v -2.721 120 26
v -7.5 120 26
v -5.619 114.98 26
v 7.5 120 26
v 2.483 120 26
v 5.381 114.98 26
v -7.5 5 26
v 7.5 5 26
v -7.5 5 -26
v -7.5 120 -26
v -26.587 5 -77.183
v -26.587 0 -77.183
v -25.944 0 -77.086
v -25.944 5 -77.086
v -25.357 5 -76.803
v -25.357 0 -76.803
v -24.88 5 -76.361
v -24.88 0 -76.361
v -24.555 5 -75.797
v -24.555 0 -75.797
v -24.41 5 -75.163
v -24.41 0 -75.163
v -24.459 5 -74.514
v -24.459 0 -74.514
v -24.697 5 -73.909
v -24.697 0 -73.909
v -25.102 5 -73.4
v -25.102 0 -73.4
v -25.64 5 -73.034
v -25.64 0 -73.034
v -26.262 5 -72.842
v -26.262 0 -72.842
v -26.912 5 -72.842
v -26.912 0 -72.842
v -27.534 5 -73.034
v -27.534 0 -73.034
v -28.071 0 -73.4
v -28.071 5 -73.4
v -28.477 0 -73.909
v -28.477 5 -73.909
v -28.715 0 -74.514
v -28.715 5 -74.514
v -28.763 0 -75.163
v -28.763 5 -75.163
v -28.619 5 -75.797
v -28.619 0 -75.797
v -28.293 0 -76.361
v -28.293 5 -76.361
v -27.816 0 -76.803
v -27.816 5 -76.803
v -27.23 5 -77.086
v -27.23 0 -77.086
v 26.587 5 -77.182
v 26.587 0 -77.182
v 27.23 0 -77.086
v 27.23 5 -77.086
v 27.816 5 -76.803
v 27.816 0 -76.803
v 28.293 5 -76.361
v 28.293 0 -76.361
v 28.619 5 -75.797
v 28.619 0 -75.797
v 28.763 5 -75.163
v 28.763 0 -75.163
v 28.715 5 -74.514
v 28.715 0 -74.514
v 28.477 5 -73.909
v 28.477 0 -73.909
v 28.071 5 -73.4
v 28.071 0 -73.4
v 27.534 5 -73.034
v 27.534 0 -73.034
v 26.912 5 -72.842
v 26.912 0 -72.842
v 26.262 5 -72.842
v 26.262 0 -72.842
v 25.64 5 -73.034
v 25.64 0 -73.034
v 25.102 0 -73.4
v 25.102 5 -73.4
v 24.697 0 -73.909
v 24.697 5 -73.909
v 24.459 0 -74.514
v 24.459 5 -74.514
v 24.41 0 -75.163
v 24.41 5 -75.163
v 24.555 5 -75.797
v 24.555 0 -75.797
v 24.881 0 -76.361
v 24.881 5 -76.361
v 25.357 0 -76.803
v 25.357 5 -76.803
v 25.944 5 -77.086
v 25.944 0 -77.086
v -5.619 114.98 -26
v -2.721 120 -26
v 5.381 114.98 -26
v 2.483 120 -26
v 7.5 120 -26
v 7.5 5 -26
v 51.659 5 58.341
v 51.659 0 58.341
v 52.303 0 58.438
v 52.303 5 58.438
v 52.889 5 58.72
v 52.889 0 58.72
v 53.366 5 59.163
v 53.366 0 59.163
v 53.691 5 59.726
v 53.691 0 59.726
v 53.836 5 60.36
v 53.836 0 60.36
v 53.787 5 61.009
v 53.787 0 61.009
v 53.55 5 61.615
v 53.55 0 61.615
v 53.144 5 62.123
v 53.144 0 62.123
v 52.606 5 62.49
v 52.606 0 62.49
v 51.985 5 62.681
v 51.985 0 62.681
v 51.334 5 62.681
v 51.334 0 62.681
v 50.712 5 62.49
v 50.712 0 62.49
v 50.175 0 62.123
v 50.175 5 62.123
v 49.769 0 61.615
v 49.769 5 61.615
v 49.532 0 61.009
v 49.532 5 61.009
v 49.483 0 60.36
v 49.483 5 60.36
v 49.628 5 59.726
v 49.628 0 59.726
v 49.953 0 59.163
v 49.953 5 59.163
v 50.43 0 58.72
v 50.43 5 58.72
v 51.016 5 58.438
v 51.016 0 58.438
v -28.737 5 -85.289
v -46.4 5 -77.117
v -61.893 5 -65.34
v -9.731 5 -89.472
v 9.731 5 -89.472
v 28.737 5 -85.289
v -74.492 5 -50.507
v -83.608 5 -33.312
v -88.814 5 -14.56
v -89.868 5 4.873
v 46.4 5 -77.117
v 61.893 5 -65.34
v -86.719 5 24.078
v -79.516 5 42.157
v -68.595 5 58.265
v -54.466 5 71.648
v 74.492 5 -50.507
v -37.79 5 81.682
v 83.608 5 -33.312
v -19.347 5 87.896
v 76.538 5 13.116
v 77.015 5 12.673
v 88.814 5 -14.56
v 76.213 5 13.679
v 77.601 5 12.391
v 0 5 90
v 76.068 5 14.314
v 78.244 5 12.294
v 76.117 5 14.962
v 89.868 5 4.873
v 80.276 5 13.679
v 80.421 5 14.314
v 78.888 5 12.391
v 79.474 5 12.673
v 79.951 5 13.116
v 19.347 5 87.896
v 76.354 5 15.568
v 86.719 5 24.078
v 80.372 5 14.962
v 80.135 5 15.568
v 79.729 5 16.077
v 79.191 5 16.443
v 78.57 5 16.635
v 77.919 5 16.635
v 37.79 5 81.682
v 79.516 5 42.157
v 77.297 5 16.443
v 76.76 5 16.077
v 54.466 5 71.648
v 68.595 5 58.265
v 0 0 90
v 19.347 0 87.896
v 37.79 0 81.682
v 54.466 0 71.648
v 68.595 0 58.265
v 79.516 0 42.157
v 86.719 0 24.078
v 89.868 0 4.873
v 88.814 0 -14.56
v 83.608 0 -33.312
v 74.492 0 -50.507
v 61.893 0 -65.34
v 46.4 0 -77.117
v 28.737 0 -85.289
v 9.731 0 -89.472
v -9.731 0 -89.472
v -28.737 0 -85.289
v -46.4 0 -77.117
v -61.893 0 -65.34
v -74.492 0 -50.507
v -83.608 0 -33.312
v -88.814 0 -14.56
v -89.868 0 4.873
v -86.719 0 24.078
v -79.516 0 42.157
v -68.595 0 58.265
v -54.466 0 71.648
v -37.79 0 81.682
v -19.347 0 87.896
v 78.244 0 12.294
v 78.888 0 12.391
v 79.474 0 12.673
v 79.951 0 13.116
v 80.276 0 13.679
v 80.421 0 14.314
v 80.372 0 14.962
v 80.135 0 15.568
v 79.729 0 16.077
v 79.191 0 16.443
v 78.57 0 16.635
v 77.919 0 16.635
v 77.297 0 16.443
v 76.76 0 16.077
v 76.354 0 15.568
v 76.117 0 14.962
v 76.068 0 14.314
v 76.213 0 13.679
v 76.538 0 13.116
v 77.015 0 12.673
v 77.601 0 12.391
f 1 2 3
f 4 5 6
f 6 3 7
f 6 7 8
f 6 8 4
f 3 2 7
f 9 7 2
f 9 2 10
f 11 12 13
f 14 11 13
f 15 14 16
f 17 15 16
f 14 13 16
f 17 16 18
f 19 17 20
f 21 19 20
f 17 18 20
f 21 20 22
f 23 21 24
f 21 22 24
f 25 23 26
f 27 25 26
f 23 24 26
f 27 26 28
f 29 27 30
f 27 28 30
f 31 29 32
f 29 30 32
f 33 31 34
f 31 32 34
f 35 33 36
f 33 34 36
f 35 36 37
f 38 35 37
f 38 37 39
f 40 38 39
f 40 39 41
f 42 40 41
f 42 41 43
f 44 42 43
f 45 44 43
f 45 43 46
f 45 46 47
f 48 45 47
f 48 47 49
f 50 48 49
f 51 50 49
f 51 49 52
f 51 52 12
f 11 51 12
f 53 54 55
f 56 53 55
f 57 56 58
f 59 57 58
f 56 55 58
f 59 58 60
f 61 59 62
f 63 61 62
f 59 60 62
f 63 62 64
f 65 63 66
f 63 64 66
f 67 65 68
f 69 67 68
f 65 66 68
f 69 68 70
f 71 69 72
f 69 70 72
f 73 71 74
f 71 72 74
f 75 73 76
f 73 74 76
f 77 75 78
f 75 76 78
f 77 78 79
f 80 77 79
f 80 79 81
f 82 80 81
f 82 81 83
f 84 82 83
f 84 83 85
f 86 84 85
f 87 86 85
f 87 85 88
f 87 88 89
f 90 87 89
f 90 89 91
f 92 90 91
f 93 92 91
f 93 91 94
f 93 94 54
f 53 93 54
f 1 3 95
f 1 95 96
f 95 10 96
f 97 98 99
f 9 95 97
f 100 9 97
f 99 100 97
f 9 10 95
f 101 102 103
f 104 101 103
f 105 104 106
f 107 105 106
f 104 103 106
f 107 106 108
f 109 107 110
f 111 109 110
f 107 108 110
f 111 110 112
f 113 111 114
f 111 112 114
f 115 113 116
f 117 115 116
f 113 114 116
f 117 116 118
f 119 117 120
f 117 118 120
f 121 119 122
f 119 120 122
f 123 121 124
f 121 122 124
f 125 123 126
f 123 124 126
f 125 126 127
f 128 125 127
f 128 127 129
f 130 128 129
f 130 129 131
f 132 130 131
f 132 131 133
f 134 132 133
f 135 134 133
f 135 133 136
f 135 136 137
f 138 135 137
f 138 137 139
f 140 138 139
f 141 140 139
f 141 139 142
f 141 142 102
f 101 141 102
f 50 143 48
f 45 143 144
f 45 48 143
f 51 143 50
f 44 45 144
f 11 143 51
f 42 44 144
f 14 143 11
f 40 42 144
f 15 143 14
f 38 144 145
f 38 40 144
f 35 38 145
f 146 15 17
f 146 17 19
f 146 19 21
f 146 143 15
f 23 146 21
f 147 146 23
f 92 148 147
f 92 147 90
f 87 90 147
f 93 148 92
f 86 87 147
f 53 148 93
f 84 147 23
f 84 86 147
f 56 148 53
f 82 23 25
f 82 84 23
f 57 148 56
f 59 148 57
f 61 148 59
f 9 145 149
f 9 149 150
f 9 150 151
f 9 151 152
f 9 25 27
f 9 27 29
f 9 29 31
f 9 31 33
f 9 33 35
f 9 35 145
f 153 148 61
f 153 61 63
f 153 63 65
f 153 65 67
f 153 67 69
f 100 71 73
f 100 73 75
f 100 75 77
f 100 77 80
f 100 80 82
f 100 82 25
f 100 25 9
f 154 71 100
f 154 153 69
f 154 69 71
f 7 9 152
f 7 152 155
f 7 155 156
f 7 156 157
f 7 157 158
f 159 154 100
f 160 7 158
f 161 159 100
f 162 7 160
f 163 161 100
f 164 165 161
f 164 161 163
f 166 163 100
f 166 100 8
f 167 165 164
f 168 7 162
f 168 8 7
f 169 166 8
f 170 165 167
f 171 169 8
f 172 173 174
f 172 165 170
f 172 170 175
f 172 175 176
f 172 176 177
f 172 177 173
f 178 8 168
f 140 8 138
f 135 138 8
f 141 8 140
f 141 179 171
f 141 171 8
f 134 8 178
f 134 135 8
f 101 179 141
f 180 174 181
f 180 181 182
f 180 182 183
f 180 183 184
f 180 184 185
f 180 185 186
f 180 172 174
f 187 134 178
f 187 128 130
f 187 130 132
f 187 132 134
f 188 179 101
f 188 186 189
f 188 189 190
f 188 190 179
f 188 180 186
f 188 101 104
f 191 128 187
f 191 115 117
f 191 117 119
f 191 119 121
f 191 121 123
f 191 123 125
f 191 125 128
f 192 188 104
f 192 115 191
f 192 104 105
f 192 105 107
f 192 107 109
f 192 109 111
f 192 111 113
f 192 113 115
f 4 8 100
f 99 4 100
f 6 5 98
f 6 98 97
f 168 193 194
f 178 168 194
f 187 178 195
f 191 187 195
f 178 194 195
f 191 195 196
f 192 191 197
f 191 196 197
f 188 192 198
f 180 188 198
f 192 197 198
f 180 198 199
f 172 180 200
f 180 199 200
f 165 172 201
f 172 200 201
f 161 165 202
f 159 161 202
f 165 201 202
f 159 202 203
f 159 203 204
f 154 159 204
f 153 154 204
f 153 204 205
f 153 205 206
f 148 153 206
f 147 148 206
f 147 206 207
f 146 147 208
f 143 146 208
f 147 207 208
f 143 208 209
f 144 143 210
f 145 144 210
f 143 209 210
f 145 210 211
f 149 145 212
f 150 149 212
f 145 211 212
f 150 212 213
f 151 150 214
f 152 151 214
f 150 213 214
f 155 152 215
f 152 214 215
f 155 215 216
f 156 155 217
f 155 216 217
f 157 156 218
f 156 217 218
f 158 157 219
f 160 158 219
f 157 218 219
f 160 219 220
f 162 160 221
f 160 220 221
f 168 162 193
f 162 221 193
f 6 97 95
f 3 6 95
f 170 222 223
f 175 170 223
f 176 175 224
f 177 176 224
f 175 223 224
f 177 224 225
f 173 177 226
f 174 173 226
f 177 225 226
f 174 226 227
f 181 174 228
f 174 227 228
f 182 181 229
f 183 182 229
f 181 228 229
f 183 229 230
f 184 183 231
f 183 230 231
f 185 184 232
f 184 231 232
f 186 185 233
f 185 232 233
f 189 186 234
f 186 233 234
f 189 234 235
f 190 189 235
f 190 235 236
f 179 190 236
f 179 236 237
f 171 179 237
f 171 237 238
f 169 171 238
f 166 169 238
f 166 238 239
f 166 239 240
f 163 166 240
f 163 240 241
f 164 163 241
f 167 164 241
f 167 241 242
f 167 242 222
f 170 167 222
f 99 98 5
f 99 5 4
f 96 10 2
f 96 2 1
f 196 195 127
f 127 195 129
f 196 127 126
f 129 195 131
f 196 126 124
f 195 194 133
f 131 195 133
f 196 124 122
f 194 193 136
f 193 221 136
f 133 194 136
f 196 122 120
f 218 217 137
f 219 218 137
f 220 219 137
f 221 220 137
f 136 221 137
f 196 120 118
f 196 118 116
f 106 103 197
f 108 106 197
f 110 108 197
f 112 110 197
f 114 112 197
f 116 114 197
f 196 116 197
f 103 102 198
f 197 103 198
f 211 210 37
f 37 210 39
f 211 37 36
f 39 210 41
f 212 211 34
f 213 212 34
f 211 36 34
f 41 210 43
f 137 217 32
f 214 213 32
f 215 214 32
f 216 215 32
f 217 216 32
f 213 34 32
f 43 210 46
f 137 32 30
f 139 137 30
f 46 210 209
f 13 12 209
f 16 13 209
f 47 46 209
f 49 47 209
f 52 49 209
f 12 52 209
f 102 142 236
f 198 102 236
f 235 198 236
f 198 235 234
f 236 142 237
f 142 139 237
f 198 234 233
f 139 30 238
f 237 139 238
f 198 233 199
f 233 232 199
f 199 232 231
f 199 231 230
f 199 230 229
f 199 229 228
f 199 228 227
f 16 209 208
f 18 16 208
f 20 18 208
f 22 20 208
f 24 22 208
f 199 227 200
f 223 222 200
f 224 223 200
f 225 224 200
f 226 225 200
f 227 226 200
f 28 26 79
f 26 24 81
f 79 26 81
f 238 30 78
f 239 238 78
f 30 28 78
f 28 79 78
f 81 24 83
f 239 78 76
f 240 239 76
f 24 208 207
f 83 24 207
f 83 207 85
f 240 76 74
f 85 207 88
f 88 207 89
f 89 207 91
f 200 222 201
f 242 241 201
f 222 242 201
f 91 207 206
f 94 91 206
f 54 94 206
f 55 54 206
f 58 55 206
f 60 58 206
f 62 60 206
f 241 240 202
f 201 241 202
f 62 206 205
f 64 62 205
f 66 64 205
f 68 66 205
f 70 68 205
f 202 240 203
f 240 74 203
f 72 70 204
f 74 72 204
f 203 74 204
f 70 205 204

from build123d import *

# Parameters (mm, degrees)
SKETCH1_R           = 90
BOSS_EXTRUDE2_DEPTH = 5
SKETCH3_W           = 15
SKETCH3_H           = 52
BOSS_EXTRUDE3_DEPTH = 120
CUT_EXTRUDE1_DEPTH  = 80
SKETCH8_R           = 2.1825
SKETCH8_R_2         = 2.18255
CUT_EXTRUDE3_DEPTH  = 80


with BuildPart() as part:
    # Sketch1 → Boss-Extrude2 (new body)
    with BuildSketch(Plane(origin=(0, 0, 0), x_dir=(1, 0, 0), z_dir=(0, 1, 0))):
        with Locations(Location((0, 0, 0), (0, 0, 270))):
            Circle(SKETCH1_R)
    extrude(amount=BOSS_EXTRUDE2_DEPTH)

    # Sketch3 → Boss-Extrude3 (add)
    with BuildSketch(Plane(origin=(0, 0, 0), x_dir=(1, 0, 0), z_dir=(0, 1, 0))):
        Rectangle(SKETCH3_W, SKETCH3_H)
    extrude(amount=BOSS_EXTRUDE3_DEPTH)

    # Sketch5 → Cut-Extrude1 (cut)
    with BuildSketch(Plane.XY.offset(26)):
        Polygon((-5.619057526, 114.98), (-2.720759175, 120), (2.482644122, 120), (5.380942474, 114.98), align=None)
    extrude(amount=-CUT_EXTRUDE1_DEPTH, mode=Mode.SUBTRACT)

    # Sketch8 → Cut-Extrude3 (cut)
    with BuildSketch(Plane.XZ):
        with Locations(Location((26.586875, -75, 0), (0, 0, 270))):
            Circle(SKETCH8_R)
        with Locations(Location((-26.586875, -75, 0), (0, 0, 270))):
            Circle(SKETCH8_R_2)
        with Locations(Location((51.659405284, 60.52328536, 0), (0, 0, 270))):
            Circle(SKETCH8_R)
        with Locations(Location((78.244405284, 14.47671464, 0), (0, 0, 270))):
            Circle(SKETCH8_R)
    extrude(amount=-CUT_EXTRUDE3_DEPTH, mode=Mode.SUBTRACT)


solid = part.part
